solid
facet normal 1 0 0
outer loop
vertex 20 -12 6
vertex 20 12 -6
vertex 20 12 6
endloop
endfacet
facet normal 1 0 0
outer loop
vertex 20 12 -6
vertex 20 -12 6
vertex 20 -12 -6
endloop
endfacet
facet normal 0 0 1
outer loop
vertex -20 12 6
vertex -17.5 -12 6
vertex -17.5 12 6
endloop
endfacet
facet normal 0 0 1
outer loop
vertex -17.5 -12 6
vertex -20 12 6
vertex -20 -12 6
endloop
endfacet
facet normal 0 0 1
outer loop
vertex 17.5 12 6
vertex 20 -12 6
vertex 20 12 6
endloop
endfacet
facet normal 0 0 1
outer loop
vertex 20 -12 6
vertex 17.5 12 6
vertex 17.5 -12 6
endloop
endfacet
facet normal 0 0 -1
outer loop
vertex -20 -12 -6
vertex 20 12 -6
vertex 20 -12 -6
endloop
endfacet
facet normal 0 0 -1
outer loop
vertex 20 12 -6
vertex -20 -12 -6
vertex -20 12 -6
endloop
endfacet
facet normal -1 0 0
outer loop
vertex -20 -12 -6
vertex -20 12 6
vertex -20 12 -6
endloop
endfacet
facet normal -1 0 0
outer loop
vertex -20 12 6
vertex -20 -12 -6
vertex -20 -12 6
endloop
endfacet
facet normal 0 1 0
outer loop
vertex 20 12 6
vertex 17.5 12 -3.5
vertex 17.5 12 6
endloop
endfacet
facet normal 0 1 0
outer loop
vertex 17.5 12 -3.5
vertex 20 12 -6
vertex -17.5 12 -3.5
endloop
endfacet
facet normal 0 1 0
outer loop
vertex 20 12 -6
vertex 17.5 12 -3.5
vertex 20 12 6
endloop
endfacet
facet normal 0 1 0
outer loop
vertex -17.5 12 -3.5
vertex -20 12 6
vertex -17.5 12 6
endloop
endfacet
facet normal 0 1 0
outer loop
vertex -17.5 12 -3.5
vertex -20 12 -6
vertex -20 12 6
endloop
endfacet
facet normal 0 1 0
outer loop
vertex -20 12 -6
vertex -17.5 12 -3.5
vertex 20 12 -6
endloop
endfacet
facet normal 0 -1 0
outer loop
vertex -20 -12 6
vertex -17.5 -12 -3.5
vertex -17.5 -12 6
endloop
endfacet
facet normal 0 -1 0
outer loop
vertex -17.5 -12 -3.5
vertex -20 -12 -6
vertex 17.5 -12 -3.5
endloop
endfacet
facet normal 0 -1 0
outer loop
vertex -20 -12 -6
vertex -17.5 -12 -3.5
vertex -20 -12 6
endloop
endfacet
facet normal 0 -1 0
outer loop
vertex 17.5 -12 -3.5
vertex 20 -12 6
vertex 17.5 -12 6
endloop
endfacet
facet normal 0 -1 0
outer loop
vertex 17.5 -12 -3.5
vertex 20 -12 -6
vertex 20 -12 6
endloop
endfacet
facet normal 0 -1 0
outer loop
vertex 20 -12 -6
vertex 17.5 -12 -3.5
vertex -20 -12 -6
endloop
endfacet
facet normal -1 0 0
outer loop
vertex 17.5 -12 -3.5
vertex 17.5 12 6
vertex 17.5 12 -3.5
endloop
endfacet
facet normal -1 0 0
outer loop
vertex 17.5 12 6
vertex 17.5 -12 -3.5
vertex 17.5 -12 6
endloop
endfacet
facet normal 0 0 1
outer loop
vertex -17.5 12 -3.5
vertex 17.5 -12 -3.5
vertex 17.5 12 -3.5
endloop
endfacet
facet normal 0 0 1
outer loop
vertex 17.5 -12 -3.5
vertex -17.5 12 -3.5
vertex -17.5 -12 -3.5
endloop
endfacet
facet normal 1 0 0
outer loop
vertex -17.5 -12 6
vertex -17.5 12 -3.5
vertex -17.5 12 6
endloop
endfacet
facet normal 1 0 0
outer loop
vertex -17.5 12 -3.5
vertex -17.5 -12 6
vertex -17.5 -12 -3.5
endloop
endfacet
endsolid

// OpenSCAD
// Parametric bracket — syntax highlighting sample
$fn = 72;
width = 40;
wall = 2.5;
enabled = true;

function clamp01(value) = min(1, max(0, value));

module bracket(size = [width, 24, 12], thickness = wall) {
    difference() {
        cube(size, center = true);
        translate([0, 0, thickness])
            cube([size[0] - 2 * thickness, size[1], size[2]], center = true);
    }
}

if (enabled)
    color("steelblue") bracket();
